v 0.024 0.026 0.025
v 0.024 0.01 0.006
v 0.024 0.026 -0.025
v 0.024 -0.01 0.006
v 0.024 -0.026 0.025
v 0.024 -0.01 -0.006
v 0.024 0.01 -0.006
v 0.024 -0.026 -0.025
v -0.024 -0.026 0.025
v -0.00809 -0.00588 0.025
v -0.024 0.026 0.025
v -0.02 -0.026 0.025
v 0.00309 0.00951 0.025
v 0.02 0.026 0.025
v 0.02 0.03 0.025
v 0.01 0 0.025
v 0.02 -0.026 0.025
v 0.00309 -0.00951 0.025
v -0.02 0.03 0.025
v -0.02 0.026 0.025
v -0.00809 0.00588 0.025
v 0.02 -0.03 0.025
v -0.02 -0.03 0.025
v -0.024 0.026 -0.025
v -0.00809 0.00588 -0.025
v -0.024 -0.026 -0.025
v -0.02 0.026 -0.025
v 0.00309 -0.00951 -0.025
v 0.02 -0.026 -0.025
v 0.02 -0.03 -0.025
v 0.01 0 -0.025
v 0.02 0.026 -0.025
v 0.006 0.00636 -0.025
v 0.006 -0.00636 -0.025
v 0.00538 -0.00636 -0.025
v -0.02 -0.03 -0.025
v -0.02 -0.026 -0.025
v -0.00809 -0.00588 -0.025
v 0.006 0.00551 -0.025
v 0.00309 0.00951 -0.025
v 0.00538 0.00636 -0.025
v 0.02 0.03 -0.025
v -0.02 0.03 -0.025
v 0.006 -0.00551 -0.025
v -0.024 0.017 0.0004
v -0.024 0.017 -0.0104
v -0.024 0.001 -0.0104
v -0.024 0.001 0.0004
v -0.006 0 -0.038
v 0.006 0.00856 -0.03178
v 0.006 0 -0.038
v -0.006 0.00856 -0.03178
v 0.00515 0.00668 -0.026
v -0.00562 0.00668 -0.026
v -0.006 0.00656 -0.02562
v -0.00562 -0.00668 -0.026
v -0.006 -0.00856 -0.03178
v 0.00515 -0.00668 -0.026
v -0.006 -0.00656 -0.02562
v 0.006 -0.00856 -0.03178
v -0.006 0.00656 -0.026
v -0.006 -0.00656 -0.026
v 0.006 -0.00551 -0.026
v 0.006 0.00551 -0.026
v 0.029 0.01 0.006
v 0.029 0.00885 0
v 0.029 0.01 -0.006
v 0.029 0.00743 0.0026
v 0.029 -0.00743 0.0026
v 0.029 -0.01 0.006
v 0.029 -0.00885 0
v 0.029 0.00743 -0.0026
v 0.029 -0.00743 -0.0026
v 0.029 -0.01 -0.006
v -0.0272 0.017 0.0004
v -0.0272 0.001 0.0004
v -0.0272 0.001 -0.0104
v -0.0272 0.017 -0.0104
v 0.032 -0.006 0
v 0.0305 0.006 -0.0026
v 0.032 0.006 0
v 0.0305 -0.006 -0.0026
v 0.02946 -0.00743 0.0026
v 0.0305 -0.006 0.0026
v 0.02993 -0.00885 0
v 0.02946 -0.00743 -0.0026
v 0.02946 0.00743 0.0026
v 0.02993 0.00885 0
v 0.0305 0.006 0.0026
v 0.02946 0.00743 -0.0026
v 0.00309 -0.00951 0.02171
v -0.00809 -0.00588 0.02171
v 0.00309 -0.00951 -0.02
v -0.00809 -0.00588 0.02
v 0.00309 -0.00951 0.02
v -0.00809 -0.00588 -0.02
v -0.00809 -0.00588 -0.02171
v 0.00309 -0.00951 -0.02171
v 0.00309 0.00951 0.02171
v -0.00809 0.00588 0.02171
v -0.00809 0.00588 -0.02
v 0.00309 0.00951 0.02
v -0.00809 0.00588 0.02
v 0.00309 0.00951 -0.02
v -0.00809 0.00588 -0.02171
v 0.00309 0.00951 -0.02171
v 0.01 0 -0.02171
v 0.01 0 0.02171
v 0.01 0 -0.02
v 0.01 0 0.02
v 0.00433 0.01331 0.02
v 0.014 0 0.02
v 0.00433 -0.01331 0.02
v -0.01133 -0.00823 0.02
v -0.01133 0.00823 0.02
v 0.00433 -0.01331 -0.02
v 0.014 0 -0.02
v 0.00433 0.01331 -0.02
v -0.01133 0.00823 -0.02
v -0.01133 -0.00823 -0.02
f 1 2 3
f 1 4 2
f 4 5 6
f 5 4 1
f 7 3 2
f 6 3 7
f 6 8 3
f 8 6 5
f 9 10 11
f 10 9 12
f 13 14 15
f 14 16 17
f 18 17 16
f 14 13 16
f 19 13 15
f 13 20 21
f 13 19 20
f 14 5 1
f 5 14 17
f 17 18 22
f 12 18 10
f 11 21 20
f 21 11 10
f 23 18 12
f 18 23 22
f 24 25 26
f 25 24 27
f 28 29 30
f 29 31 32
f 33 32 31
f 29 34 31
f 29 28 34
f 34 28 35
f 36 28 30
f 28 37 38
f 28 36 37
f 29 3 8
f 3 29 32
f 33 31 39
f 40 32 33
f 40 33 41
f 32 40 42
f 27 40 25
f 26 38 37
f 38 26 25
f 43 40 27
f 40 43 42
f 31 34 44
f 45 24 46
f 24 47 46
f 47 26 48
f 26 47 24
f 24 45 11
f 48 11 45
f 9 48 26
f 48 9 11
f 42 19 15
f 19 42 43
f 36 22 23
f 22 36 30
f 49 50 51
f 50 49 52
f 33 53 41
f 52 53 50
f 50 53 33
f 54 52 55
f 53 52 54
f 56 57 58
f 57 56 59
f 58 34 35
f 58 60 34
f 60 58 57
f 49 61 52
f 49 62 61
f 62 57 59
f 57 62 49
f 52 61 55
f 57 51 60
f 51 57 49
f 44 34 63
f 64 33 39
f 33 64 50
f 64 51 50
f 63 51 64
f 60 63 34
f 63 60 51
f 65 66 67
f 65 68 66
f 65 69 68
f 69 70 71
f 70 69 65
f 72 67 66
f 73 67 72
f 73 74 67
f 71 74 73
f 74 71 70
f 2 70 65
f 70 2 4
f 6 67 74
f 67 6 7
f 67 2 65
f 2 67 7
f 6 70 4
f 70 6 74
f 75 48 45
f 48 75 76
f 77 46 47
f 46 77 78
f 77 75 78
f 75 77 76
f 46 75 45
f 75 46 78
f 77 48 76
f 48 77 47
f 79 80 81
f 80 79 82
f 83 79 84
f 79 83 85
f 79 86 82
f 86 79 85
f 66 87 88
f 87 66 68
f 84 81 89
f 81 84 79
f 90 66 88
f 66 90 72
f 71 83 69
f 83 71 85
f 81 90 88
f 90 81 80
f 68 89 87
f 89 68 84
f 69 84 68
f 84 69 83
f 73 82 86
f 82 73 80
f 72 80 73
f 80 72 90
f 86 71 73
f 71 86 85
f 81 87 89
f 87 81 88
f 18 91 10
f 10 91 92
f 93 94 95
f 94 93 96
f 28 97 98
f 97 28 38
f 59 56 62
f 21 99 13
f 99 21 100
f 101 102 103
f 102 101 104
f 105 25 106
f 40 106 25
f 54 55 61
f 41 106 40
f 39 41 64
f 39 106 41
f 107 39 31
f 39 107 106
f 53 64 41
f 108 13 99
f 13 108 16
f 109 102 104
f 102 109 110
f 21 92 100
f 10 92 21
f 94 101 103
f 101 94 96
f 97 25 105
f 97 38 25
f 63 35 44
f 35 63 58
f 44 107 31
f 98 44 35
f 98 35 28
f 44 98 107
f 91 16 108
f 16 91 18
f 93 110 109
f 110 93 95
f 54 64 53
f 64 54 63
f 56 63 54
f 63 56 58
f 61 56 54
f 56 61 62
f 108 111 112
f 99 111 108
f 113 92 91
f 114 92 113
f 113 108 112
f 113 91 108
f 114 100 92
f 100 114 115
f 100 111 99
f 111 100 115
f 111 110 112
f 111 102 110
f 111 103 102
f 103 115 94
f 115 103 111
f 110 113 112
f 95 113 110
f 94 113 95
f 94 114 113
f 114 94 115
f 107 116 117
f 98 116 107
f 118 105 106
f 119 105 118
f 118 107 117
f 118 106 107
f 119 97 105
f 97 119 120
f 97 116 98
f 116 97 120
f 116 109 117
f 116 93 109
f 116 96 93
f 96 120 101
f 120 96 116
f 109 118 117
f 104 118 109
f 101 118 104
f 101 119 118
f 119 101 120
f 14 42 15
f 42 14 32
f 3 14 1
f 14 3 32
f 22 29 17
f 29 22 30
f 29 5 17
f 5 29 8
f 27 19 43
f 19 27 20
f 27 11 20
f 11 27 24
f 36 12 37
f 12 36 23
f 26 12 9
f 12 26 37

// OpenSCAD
// Parameters
bbox_x = 0.06; //[0.03:0.12:0.001]
bbox_y = 0.06; //[0.03:0.12:0.001]
bbox_z = 0.05; //[0.025:0.1:0.001]
body_x = 0.048; //[0.024:0.096:0.001]
body_y = 0.06; //[0.03:0.12:0.001]
body_z = 0.05; //[0.025:0.1:0.001]
bore_d = 0.02; //[0.01:0.04:0.001]
boss_d = 0.018; //[0.009:0.036:0.001]
boss_len = 0.012; //[0.006:0.024:0.001]
tab_depth = 0.006; //[0.003:0.012:0.001]
tab_len = 0.02; //[0.01:0.04:0.001]
tab_z = 0.012; //[0.006:0.024:0.001]
overlap = 0.001; //[0.0005:0.002:0.0001]
lead_in_h = 0.006; //[0.003:0.012:0.001]
lead_in_d = 0.028; //[0.022:0.04:0.001]
edge_relief = 0.004; //[0.002:0.008:0.001]
boss_blend_r = 0.003; //[0.0015:0.006:0.0005]

// Main body
module main_body() {
  cube([body_x, body_y, body_z], center=true);
}

// Center through-bore
module center_through_bore() {
  cylinder(h=body_z + 2*overlap, r=bore_d/2, center=true);
}

// Side boss
module side_boss() {
  rotate([0, 90, 0])
    translate([body_x/2 + boss_len/2 - overlap, 0, 0])
      cylinder(h=boss_len, r=boss_d/2, center=true);
}

// Key tab on positive face
module key_tab_pos_face() {
  translate([body_x/2 + tab_depth/2 - overlap, 0, 0])
    cube([tab_depth, tab_len, tab_z], center=true);
}

// Key tab on negative face
module key_tab_neg_face() {
  translate([-body_x/2 - (tab_depth*0.7)/2 + overlap, body_y*0.15, -body_z*0.1])
    cube([tab_depth*0.7, tab_len*0.8, tab_z*0.9], center=true);
}

// Edge chamfer cuts
module edge_chamfer_cut(x, y) {
  translate([x, y, 0])
    cube([edge_relief, edge_relief, body_z + 2*overlap], center=true);
}

// Bore lead-in chamfers
module bore_lead_in_top() {
  translate([0, 0, body_z/2 - lead_in_h/2 + overlap])
    cylinder(h=lead_in_h, r1=lead_in_d/2, r2=0, center=true);
}

module bore_lead_in_bottom() {
  translate([0, 0, -body_z/2 + lead_in_h/2 - overlap])
    rotate([180, 0, 0])
      cylinder(h=lead_in_h, r1=lead_in_d/2, r2=0, center=true);
}

// Boss blend fillet
module boss_blend_fillet() {
  hull() {
    translate([body_x/2 - overlap, boss_d/2 - boss_blend_r, 0])
      sphere(r=boss_blend_r, center=true);
    translate([body_x/2 - overlap, -boss_d/2 + boss_blend_r, 0])
      sphere(r=boss_blend_r, center=true);
    translate([body_x/2 + boss_len/2 - overlap, boss_d/2 - boss_blend_r, 0])
      sphere(r=boss_blend_r, center=true);
    translate([body_x/2 + boss_len/2 - overlap, -boss_d/2 + boss_blend_r, 0])
      sphere(r=boss_blend_r, center=true);
  }
}

// Final model
difference() {
  union() {
    main_body();
    side_boss();
    key_tab_pos_face();
    key_tab_neg_face();
    boss_blend_fillet();
  }
  edge_chamfer_cut(body_x/2 - edge_relief/2, body_y/2 - edge_relief/2);
  edge_chamfer_cut(body_x/2 - edge_relief/2, -body_y/2 + edge_relief/2);
  edge_chamfer_cut(-body_x/2 + edge_relief/2, body_y/2 - edge_relief/2);
  edge_chamfer_cut(-body_x/2 + edge_relief/2, -body_y/2 + edge_relief/2);
  union() {
    center_through_bore();
    bore_lead_in_top();
    bore_lead_in_bottom();
  }
}
